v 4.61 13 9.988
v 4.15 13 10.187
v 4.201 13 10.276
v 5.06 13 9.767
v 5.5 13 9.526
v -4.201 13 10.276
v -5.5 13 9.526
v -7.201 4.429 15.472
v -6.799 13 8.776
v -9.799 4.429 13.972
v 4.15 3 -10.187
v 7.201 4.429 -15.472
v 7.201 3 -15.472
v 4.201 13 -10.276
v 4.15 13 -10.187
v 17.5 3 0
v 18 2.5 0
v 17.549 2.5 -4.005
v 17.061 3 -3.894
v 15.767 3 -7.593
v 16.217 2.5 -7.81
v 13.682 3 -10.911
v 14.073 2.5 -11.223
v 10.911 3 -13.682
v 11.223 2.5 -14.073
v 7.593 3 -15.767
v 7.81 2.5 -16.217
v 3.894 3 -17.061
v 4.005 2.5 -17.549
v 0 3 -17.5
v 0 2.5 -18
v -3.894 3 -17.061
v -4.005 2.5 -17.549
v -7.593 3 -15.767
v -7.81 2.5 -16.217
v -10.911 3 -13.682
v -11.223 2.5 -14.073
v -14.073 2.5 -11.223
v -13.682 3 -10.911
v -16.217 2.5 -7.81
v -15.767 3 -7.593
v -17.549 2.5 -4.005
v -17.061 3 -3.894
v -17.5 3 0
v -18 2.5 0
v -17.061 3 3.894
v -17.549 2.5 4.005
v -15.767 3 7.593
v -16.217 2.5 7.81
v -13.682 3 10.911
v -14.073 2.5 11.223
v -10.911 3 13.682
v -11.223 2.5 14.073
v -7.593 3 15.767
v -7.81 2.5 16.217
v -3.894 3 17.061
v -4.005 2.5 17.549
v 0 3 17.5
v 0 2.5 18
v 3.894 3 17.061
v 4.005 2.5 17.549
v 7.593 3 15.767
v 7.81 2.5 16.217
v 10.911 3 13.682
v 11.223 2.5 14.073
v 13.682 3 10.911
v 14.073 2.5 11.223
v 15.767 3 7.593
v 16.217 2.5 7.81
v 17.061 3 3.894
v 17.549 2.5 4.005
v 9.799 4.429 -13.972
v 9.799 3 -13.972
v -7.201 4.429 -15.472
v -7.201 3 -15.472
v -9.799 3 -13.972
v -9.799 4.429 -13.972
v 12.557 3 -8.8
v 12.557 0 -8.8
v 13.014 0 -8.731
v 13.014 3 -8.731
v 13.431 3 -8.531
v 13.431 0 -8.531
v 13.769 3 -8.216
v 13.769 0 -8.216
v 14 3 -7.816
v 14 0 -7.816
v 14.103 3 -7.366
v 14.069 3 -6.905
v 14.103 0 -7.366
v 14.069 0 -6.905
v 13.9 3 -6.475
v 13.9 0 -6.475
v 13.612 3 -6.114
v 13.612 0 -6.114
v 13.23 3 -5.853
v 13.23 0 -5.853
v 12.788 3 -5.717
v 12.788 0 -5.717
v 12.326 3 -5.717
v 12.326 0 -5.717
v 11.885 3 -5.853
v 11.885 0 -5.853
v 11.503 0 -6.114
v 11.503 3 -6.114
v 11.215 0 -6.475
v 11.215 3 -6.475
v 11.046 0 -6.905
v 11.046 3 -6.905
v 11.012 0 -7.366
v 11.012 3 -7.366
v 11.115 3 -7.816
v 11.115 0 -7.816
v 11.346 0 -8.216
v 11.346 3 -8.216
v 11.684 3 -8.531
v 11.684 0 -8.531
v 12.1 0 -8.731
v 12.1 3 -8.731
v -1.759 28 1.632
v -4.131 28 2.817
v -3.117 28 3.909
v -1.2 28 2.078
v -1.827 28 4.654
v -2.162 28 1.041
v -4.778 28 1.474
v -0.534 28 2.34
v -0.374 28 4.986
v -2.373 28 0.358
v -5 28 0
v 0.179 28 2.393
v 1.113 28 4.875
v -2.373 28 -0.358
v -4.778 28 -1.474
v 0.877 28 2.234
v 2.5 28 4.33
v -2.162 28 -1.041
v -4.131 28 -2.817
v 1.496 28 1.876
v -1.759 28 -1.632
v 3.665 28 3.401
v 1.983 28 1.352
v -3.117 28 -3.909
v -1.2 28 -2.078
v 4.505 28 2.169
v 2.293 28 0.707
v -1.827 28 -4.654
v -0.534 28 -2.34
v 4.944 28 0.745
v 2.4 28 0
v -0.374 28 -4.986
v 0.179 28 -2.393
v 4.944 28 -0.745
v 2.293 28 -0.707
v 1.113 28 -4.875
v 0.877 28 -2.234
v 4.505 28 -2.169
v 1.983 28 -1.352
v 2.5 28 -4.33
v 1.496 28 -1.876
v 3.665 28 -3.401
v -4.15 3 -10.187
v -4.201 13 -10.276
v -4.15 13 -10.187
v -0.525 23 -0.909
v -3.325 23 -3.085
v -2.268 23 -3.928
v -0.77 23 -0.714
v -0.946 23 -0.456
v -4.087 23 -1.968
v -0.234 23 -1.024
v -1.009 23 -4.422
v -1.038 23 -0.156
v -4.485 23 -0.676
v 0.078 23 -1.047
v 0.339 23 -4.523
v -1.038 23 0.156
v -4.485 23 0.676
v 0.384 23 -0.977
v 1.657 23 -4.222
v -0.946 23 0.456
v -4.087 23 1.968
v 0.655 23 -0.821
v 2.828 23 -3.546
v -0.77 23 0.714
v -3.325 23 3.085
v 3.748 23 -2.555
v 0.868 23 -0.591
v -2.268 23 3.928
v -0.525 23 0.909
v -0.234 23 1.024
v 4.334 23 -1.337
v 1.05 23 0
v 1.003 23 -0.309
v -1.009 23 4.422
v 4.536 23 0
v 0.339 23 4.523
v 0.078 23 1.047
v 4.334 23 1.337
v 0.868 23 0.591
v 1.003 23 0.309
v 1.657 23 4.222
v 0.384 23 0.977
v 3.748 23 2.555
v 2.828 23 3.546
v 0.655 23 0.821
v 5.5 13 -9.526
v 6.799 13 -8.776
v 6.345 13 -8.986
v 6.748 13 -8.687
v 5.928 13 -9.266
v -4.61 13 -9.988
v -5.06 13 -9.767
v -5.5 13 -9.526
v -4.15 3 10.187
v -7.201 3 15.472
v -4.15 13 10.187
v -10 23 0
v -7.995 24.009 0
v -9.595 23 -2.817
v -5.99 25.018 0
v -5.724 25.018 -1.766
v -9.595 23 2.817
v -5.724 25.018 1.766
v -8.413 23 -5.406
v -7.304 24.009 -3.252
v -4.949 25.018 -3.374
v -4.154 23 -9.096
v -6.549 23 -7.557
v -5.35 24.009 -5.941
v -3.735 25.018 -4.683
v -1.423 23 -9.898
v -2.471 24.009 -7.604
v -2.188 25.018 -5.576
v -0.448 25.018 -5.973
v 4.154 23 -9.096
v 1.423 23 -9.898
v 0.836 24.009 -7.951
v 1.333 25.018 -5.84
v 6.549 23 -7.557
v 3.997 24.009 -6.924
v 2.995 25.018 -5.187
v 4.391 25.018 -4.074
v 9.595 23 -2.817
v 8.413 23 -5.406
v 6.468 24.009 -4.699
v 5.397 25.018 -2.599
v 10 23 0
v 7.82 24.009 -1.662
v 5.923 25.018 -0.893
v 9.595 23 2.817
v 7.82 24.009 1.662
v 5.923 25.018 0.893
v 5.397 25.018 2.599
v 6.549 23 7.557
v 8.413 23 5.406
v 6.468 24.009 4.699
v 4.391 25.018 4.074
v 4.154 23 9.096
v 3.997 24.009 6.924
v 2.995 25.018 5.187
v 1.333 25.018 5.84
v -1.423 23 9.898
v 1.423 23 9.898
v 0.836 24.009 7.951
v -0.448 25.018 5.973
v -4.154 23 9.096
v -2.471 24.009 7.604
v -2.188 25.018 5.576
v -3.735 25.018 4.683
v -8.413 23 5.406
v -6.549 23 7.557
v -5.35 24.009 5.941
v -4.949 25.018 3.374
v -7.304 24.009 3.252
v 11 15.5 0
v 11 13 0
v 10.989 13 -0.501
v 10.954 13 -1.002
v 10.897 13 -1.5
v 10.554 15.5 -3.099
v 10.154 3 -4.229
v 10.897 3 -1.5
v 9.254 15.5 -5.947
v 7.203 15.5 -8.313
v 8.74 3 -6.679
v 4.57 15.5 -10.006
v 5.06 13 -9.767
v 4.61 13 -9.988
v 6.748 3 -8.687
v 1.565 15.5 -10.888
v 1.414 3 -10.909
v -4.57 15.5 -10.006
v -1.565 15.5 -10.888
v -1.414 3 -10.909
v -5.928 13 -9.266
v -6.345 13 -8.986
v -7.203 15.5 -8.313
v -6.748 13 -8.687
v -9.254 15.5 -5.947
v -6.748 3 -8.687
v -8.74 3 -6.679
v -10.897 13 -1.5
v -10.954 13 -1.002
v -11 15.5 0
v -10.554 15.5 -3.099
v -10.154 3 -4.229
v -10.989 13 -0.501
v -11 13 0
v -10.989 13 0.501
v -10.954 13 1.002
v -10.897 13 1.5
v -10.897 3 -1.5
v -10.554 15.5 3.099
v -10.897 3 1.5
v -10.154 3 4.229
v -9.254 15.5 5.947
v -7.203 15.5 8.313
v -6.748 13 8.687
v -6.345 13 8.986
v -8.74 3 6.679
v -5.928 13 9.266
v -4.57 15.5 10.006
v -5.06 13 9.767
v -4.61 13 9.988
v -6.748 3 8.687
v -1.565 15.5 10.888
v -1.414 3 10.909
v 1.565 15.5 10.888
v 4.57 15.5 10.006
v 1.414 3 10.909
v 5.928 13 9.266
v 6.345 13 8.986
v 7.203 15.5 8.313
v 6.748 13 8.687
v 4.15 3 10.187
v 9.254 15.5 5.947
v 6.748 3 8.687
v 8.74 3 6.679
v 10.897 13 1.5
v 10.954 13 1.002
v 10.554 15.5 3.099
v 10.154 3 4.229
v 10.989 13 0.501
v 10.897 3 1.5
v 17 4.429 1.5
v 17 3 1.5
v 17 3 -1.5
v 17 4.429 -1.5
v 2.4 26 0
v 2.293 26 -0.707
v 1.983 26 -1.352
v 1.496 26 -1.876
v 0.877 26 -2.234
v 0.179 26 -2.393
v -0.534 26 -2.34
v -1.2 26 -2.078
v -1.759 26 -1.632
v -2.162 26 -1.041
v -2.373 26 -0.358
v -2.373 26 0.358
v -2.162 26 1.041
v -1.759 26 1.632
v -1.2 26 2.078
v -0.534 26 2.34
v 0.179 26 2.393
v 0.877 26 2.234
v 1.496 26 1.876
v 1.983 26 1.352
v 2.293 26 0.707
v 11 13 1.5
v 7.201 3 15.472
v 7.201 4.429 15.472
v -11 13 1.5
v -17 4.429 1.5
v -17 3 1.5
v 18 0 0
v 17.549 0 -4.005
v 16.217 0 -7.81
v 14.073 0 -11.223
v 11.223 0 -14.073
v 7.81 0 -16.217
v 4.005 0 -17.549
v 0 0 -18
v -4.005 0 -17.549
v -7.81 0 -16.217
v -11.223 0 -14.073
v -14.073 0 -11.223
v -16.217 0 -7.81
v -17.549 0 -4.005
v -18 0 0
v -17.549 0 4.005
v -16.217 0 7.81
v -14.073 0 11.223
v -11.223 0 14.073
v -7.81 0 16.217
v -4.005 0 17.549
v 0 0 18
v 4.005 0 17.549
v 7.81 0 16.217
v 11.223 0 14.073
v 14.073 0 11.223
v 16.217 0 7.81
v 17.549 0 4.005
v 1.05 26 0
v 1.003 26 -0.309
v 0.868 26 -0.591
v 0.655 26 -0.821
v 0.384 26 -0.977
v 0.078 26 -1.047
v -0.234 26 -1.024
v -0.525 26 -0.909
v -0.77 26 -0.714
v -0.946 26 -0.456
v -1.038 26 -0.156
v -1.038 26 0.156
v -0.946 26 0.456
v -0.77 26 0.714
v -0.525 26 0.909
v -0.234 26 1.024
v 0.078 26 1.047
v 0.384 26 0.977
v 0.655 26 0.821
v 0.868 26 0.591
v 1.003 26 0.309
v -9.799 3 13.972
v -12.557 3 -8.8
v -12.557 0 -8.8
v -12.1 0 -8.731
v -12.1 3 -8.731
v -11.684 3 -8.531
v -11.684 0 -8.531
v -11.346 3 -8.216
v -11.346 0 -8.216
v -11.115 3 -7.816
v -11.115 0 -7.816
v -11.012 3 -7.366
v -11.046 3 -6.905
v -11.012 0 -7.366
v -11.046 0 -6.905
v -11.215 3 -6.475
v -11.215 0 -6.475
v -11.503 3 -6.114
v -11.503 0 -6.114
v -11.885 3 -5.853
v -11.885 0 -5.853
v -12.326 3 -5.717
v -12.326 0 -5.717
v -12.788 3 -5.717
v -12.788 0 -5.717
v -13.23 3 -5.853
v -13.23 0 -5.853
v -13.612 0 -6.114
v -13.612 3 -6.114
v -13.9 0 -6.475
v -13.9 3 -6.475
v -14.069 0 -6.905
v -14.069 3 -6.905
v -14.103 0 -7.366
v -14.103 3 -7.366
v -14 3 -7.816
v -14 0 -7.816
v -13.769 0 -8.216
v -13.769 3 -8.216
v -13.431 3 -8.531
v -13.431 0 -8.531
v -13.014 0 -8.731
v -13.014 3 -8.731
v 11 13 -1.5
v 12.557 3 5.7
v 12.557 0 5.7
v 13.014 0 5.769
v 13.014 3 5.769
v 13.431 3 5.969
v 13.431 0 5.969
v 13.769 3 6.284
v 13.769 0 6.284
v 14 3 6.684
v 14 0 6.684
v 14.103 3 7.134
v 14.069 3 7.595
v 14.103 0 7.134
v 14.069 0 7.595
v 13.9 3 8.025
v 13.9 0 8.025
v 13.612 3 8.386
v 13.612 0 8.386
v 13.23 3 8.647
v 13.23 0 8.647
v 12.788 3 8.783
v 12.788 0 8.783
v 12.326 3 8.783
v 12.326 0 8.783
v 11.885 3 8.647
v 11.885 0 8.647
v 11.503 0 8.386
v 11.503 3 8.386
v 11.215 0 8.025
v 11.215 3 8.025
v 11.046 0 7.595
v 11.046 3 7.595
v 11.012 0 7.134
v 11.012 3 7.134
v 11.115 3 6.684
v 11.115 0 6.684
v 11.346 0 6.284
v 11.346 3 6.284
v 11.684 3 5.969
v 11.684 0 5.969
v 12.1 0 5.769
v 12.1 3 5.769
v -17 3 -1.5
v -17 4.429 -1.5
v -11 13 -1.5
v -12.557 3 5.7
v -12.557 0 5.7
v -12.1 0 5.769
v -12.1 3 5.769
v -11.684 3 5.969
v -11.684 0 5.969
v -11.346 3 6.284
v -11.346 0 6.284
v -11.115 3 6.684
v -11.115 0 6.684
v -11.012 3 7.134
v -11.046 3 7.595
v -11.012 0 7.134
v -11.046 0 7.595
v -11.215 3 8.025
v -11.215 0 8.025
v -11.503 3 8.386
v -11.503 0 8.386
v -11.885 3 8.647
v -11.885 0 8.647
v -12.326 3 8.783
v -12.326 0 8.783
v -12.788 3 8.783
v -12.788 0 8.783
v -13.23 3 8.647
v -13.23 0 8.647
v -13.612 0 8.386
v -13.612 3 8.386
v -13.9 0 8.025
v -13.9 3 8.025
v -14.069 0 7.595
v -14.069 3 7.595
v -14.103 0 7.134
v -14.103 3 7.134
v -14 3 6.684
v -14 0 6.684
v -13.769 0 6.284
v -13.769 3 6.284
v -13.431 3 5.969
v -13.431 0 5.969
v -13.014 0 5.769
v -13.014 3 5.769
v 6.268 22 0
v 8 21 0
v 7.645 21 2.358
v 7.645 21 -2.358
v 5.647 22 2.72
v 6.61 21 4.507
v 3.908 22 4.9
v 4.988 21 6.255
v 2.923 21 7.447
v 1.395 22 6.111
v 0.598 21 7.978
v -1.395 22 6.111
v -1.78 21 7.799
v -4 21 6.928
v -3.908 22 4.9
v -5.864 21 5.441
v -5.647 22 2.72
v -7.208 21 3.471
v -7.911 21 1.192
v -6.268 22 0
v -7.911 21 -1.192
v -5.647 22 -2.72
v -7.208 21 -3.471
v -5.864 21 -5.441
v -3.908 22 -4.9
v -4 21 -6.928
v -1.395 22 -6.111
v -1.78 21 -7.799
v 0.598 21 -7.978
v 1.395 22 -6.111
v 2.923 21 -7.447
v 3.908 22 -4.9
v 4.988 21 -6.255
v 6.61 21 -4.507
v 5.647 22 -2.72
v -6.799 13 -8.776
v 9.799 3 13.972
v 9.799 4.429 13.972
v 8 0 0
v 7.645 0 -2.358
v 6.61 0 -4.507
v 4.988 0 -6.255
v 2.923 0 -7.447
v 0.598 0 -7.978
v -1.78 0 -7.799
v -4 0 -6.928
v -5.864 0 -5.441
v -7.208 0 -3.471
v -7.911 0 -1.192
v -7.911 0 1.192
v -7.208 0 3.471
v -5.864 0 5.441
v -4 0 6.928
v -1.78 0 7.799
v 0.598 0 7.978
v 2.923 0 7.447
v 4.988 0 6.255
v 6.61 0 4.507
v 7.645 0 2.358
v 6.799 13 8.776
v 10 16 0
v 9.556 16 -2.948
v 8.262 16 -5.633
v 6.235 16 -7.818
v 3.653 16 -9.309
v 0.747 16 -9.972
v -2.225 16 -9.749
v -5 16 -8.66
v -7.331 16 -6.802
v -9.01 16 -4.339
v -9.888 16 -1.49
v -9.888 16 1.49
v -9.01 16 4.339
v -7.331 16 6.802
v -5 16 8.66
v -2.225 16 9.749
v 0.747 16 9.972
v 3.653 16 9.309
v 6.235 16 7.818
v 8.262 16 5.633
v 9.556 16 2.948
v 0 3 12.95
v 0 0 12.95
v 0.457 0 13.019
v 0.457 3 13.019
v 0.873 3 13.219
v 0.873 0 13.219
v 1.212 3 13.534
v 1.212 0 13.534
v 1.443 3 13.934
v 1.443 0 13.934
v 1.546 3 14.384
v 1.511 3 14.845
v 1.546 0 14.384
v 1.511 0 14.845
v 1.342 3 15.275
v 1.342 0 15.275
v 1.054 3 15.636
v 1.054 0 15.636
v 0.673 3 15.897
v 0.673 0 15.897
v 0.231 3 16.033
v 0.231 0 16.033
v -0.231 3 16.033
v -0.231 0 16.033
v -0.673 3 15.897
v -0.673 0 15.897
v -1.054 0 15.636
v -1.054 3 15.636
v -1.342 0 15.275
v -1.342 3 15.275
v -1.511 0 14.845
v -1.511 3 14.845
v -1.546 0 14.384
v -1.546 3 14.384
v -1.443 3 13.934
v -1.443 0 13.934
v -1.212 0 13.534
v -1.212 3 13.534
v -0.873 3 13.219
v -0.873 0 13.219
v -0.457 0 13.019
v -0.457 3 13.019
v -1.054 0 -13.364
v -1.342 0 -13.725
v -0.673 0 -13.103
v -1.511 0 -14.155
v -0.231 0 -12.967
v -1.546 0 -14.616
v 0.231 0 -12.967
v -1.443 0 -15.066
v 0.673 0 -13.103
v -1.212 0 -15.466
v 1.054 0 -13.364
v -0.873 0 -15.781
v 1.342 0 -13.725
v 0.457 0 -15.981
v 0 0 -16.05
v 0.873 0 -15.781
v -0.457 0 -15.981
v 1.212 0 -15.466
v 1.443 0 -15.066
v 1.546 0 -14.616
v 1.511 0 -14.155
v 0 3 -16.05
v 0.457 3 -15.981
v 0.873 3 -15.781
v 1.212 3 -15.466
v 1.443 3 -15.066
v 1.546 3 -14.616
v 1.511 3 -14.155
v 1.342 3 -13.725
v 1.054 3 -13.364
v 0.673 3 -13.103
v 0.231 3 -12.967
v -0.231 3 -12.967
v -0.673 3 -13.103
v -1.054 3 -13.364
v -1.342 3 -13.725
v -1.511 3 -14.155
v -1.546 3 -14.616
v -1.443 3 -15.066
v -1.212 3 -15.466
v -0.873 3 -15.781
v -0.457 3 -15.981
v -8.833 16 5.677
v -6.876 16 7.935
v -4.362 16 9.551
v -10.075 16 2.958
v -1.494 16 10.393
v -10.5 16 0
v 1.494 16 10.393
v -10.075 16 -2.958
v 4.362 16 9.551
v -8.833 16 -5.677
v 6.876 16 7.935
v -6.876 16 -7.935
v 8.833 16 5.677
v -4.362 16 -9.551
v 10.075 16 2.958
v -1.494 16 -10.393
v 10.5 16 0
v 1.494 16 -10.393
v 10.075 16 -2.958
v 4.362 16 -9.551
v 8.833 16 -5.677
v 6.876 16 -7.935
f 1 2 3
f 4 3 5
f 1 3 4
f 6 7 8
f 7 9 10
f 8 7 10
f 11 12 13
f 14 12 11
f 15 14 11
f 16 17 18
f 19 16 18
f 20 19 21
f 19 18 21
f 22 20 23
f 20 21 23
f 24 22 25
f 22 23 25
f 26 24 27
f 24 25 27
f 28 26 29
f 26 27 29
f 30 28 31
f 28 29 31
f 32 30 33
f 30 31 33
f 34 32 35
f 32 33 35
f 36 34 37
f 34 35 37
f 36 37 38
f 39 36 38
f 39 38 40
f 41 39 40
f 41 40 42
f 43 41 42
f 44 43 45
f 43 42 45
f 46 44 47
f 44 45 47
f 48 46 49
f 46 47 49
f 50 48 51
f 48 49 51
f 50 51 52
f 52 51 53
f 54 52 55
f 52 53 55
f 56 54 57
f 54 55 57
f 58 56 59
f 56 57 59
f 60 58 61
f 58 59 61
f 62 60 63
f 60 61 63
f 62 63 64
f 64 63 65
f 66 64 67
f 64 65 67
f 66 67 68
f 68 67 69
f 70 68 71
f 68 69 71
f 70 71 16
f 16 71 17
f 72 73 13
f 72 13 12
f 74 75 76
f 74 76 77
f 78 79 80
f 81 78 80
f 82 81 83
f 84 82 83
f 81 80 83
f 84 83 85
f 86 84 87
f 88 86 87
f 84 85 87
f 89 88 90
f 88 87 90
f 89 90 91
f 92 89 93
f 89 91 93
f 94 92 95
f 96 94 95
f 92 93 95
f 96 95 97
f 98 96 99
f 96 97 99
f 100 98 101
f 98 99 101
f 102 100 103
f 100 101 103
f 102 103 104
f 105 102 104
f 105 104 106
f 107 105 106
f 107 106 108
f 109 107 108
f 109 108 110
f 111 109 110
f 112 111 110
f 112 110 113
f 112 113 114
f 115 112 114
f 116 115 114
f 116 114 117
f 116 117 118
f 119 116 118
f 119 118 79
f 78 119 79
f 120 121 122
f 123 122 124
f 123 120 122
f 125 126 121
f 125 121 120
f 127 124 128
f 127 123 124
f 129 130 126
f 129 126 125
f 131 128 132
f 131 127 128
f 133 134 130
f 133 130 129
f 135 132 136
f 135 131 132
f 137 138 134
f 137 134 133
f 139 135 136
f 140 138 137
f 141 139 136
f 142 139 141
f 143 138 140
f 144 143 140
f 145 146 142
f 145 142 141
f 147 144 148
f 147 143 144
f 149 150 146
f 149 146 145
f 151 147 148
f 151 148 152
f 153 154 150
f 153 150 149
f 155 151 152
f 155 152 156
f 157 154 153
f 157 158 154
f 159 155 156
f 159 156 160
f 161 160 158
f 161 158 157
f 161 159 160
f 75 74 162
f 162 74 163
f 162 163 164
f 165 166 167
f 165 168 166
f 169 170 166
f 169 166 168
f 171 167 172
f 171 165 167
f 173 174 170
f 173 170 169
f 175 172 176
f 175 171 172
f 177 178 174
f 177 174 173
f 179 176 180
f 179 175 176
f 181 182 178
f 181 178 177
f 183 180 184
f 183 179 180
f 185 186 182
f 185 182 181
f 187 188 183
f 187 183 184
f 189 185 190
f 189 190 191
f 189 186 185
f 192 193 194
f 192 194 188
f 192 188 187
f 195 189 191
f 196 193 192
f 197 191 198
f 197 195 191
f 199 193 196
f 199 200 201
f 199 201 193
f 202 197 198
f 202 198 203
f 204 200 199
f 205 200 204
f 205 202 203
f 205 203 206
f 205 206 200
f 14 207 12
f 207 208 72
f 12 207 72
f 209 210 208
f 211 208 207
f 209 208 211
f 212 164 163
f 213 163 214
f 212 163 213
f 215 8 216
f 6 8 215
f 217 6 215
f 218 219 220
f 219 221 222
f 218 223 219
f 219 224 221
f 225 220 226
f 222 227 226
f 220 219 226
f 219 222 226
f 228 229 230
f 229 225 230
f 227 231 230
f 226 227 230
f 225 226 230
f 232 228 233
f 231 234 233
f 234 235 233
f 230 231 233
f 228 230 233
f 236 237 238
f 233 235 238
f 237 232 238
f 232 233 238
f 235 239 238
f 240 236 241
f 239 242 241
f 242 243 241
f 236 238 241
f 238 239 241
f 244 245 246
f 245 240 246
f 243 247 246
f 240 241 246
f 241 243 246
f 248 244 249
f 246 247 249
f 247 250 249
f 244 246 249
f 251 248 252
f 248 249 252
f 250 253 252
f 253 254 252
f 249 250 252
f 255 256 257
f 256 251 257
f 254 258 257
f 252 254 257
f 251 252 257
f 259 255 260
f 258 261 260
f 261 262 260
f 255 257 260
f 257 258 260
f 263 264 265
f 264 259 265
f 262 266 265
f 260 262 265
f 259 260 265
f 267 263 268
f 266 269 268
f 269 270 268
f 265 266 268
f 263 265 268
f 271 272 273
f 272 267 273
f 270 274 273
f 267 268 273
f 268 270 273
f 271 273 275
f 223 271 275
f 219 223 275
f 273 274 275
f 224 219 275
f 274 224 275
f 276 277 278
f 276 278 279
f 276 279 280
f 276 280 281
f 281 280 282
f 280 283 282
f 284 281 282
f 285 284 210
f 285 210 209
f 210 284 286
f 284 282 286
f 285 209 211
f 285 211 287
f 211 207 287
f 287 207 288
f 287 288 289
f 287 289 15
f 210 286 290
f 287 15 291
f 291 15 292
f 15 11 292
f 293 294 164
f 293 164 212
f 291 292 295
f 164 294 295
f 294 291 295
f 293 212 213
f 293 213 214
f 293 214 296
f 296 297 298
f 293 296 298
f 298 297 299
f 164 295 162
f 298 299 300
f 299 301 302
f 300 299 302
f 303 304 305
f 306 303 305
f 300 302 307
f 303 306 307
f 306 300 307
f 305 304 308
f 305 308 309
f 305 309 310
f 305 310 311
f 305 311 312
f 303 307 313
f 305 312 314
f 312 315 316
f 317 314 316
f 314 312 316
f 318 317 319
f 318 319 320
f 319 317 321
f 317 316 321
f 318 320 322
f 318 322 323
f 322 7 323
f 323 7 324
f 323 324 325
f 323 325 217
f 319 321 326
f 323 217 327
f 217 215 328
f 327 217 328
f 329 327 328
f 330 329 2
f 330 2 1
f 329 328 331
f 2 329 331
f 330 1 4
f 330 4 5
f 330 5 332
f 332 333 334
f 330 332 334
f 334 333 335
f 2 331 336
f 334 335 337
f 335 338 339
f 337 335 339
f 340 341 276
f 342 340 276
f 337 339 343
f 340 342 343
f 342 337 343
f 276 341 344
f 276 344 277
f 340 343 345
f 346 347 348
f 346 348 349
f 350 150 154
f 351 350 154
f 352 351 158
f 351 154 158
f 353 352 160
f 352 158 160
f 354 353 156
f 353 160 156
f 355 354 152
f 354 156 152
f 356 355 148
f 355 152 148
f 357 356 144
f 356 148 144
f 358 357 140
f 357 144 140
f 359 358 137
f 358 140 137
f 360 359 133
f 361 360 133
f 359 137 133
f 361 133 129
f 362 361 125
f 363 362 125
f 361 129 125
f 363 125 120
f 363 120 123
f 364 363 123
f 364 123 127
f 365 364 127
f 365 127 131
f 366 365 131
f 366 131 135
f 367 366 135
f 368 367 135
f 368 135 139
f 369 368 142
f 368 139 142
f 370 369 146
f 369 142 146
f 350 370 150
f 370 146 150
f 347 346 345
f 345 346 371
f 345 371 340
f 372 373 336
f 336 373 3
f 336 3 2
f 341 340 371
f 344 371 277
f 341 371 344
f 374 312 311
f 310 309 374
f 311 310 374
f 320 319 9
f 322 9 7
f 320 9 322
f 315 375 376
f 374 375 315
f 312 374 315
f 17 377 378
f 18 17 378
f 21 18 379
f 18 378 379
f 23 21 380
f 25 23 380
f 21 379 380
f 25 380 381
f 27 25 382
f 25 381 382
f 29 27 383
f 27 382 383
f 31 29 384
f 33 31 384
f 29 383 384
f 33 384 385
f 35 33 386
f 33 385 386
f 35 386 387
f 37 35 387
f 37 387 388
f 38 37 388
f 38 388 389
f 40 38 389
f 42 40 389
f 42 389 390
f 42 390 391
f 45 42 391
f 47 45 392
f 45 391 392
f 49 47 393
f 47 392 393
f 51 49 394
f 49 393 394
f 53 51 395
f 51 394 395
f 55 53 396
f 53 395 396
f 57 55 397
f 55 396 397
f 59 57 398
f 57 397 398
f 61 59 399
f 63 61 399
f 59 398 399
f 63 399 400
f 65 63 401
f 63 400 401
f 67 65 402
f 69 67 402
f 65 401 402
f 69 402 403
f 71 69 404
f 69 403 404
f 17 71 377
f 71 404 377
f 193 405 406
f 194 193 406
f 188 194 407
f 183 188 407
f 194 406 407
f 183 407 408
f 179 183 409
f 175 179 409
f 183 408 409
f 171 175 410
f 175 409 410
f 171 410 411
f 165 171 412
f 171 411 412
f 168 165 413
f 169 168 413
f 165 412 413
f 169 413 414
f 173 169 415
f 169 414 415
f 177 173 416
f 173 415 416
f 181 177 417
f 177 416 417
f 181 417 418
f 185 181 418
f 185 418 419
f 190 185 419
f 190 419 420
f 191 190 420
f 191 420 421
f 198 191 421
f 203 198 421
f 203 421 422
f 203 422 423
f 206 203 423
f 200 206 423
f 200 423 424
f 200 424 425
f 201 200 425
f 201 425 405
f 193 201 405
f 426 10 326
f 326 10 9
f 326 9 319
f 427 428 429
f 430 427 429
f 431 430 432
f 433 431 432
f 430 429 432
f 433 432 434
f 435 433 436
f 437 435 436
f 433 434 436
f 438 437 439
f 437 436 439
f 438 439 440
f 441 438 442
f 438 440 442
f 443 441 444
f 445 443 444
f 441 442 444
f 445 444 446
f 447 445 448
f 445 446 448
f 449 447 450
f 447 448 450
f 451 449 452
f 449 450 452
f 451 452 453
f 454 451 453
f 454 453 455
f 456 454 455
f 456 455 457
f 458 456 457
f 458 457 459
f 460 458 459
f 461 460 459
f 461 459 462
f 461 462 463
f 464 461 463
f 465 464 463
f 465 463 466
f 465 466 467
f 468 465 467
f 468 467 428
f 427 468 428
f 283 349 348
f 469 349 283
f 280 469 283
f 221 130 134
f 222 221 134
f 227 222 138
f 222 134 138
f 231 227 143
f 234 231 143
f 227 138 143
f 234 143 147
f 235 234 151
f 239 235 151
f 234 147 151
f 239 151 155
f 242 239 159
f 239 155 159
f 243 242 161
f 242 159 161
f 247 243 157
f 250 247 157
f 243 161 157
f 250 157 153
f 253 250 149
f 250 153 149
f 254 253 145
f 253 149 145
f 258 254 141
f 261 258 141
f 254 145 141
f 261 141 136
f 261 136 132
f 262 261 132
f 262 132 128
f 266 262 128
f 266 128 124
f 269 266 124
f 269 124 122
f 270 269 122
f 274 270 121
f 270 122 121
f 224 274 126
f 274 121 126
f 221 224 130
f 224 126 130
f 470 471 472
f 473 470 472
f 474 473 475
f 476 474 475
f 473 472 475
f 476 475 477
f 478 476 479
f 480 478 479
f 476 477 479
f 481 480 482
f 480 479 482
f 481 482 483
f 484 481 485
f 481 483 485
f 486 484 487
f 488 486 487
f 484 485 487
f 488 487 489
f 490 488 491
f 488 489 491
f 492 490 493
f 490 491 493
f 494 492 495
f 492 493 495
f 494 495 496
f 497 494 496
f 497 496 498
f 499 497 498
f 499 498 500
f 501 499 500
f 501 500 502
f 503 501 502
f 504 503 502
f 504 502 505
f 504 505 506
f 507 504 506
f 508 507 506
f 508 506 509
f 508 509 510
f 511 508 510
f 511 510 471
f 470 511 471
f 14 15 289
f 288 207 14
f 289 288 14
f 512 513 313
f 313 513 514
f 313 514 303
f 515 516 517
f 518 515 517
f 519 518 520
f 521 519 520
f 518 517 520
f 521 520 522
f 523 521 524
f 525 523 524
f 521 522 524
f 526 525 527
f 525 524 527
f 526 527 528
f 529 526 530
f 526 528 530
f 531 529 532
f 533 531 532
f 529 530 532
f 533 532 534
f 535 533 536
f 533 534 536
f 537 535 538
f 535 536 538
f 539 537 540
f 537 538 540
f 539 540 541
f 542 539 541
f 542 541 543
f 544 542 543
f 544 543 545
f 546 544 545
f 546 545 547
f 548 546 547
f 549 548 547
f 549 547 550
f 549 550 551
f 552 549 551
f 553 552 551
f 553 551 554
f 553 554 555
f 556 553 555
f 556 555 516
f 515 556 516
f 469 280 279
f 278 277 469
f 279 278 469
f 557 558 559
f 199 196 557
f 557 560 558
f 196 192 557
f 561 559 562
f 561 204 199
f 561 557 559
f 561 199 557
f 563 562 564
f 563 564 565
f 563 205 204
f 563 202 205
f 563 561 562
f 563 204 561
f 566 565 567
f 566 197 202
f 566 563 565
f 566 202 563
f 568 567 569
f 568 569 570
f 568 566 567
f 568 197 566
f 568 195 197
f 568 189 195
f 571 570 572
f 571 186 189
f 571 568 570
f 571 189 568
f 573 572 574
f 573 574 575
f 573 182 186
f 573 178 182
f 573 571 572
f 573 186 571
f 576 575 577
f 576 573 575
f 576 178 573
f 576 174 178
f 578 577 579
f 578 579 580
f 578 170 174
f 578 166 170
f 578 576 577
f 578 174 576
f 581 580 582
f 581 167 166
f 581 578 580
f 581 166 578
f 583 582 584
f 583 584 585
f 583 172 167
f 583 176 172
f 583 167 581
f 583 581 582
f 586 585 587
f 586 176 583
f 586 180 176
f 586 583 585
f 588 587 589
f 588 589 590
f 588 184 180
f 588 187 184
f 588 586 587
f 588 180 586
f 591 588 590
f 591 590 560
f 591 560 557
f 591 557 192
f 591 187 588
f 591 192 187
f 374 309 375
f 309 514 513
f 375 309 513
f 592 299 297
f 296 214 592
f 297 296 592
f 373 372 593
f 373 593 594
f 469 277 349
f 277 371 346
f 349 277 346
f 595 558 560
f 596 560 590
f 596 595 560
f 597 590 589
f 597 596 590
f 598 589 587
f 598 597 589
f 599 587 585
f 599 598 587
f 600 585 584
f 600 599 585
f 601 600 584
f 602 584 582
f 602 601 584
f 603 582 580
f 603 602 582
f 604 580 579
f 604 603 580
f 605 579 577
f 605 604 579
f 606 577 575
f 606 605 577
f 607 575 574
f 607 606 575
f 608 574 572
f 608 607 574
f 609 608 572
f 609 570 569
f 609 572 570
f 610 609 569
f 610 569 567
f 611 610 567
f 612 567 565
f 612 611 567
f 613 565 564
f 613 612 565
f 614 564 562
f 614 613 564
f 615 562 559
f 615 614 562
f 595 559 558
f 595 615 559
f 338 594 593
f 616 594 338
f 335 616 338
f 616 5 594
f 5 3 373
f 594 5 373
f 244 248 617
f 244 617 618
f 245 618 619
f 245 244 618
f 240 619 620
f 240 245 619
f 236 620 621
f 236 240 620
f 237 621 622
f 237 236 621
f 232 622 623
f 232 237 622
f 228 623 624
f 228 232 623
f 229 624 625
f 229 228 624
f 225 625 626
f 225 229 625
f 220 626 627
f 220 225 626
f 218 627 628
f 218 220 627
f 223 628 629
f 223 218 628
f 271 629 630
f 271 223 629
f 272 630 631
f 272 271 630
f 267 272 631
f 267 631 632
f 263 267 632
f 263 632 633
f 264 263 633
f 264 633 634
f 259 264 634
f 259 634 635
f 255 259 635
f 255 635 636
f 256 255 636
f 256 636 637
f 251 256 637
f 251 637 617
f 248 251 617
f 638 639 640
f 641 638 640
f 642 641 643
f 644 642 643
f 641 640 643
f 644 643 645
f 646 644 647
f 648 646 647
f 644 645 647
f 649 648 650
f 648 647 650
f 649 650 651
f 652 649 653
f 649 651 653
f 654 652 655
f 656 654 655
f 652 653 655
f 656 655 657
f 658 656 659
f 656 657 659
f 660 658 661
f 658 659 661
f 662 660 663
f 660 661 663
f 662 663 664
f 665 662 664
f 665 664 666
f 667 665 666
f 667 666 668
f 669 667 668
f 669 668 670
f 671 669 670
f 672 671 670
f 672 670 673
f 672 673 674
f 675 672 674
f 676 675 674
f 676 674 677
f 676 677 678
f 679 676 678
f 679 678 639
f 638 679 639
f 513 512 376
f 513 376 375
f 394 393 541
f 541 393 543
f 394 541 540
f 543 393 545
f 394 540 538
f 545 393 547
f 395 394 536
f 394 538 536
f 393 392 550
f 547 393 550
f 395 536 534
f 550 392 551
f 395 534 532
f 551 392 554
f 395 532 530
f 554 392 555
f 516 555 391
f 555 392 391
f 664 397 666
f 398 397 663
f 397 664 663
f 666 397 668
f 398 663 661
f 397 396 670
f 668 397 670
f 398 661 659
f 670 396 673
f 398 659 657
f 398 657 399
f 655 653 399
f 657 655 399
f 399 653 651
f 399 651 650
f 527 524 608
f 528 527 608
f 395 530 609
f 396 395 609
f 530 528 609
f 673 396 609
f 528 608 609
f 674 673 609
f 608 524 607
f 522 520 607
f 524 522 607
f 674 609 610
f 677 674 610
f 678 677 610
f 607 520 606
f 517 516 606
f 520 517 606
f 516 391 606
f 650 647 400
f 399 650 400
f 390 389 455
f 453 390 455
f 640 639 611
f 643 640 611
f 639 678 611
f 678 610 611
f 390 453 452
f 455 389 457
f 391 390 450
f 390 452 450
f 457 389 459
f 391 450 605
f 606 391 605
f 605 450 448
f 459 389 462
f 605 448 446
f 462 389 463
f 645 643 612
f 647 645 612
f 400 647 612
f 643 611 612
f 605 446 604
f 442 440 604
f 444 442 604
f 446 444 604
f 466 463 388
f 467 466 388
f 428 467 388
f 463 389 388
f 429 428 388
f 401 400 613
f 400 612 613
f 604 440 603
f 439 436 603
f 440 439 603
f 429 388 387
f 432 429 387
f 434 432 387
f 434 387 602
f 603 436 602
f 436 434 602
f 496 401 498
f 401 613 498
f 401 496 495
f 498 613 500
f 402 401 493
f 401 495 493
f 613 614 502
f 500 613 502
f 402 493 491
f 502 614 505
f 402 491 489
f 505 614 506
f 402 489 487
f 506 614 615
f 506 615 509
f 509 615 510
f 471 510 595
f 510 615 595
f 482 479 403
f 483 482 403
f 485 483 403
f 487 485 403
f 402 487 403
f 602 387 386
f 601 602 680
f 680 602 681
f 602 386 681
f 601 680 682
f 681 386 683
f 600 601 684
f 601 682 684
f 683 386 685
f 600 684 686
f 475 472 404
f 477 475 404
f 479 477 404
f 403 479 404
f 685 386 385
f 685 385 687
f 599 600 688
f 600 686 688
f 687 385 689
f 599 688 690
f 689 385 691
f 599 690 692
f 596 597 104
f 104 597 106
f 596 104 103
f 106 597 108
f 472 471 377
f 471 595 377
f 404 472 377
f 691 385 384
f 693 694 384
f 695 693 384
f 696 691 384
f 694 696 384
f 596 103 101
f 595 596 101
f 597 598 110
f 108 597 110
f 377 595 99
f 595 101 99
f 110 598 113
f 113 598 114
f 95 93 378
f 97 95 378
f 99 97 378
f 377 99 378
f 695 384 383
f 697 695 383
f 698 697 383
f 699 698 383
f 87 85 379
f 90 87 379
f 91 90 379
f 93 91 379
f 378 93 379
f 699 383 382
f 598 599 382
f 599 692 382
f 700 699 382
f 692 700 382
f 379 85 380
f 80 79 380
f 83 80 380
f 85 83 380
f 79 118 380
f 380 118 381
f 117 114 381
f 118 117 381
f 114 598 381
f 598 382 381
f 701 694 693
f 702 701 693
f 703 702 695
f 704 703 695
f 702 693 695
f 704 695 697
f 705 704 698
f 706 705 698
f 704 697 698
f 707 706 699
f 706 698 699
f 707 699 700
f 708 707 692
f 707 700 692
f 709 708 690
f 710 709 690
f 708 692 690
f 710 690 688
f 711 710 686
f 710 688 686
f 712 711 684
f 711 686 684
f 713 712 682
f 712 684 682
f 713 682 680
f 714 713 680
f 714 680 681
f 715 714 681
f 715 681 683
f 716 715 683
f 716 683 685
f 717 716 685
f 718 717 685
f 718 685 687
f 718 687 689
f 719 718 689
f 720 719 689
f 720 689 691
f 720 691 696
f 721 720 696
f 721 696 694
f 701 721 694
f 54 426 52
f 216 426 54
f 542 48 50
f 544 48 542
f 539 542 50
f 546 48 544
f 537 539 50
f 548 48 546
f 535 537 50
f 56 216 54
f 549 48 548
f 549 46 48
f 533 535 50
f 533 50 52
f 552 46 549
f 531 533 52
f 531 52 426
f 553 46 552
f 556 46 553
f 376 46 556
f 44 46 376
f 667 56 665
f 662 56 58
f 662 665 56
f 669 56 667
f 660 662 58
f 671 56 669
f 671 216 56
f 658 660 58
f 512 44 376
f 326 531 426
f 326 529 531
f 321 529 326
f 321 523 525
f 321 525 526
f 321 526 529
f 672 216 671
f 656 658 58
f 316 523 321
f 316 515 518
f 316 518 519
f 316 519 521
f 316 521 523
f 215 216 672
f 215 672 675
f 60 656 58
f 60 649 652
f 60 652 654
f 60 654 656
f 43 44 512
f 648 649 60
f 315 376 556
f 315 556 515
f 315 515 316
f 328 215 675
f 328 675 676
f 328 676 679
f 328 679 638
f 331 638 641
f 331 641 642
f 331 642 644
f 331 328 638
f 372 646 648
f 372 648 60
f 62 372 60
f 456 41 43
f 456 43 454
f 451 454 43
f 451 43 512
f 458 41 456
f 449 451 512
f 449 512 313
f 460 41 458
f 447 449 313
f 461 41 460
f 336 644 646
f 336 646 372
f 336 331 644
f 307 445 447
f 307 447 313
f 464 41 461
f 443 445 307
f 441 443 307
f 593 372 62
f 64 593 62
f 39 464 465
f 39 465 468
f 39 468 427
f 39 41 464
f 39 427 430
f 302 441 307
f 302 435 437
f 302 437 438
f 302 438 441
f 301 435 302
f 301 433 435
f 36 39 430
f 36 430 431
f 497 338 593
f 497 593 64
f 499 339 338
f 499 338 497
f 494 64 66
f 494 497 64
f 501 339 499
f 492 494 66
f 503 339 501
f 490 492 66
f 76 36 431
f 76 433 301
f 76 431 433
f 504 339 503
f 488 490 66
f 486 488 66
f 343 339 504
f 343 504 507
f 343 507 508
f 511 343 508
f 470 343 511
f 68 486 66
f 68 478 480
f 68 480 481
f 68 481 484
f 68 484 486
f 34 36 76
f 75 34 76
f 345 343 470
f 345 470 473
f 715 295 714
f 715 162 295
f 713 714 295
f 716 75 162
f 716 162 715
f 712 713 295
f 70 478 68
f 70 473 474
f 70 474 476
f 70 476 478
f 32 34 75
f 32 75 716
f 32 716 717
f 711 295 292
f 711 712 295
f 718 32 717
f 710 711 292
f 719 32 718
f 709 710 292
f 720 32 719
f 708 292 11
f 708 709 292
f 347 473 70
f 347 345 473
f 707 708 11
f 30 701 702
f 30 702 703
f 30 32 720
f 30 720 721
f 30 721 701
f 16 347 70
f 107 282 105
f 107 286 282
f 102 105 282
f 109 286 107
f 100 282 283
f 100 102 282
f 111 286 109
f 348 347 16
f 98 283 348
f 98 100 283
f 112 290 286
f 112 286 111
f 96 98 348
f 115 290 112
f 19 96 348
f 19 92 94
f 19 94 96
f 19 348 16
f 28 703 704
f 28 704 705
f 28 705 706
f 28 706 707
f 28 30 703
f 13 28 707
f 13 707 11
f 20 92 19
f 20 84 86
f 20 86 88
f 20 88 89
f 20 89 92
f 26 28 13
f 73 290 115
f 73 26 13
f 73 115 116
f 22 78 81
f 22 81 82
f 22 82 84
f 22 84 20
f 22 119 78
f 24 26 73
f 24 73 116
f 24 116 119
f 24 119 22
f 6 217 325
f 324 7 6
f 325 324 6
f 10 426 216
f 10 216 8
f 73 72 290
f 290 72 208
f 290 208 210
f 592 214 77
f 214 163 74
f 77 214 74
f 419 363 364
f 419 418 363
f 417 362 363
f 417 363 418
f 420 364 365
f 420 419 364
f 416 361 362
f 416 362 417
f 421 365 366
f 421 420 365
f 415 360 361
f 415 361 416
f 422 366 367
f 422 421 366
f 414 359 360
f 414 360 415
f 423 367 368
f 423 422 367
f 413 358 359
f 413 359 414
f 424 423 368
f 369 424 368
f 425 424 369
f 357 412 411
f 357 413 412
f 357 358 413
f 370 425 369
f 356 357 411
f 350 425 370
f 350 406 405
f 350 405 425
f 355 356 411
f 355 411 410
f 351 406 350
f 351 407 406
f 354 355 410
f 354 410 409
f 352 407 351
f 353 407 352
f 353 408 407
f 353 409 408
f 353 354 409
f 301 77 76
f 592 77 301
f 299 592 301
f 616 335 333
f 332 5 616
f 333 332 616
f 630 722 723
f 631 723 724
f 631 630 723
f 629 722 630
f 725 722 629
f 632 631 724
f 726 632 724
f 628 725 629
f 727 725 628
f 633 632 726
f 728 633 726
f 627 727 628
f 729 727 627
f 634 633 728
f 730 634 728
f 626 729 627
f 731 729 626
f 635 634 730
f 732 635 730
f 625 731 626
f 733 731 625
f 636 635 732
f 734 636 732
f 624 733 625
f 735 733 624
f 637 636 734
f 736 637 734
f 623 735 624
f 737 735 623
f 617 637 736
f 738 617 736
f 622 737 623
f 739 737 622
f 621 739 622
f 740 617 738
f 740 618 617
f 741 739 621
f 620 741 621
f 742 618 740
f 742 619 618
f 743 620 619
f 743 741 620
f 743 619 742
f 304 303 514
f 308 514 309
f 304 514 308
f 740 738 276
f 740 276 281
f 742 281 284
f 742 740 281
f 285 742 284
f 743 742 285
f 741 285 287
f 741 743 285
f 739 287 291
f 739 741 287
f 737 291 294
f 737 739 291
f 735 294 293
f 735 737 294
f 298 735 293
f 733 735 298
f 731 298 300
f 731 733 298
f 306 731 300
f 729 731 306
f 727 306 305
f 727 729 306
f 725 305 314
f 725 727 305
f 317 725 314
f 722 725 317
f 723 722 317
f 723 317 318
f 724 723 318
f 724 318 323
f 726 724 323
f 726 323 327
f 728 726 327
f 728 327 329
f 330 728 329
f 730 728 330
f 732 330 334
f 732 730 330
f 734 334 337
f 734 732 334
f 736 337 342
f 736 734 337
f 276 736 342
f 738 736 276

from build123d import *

# Parameters (mm, degrees)
SKETCH1_R                = 18
SKETCH1_R_2              = 8
BOSS_EXTRUDE1_DEPTH      = 3
SKETCH2_R                = 11
SKETCH2_R_2              = 8
BOSS_EXTRUDE2_DEPTH      = 22
M_0_295_DIAMETER_HOLE1_D = 3.099999896
BOSS_EXTRUDE3_DEPTH      = 1.5
CIRPATTERN1_COUNT        = 6
CHAMFER2_SIZE            = 0.5
SKETCH6_R                = 11
BOSS_EXTRUDE4_DEPTH      = 3
SKETCH8_R                = 8
BOSS_EXTRUDE5_DEPTH      = 2
CHAMFER3_SIZE            = 6
SKETCH7_R                = 2.4
CUT_EXTRUDE1_DEPTH       = 2
CUT_EXTRUDE2_REACH       = 28
SKETCH9_R                = 1.05
SKETCH10_R               = 11
SKETCH10_R_2             = 10
CUT_EXTRUDE3_DEPTH       = 12
CHAMFER4_SIZE            = 0.5
CHAMFER5_SIZE            = 2
CHAMFER5_SIZE2           = 3.464101615


with BuildPart() as part:
    # Sketch1 → Boss-Extrude1 (new body)
    with BuildSketch(Plane(origin=(0, 0, 0), x_dir=(1, 0, 0), z_dir=(0, 1, 0))):
        Circle(SKETCH1_R)
        Circle(SKETCH1_R_2, mode=Mode.SUBTRACT)
    extrude(amount=BOSS_EXTRUDE1_DEPTH)

    # Sketch2 → Boss-Extrude2 (add)
    with BuildSketch(Plane(origin=(0, 3, 0), x_dir=(1, 0, 0), z_dir=(0, 1, 0))):
        Circle(SKETCH2_R)
        Circle(SKETCH2_R_2, mode=Mode.SUBTRACT)
    extrude(amount=BOSS_EXTRUDE2_DEPTH)

    # M (0.295) Diameter Hole1 (through all)
    with Locations(Plane(origin=(0, 3, 14.5), x_dir=(0, 0, 1), z_dir=(0, 1, 0))):
        with Locations((0, 0), (-7.25, -12.557368355), (-7.25, 12.557368355), (-21.75, 12.557368355), (-29, 0), (-21.75, -12.557368355)):
            Hole(M_0_295_DIAMETER_HOLE1_D / 2)

    # Sketch5 → Boss-Extrude3 (add, symmetric)
    with BuildSketch(Plane.XY):
        Polygon((11, 13), (17, 4.428571429), (17, 3), (17, 2.5), (10.5, 2.5), (10.5, 13), align=None)
    boss_extrude3 = extrude(amount=BOSS_EXTRUDE3_DEPTH, both=True)

    # CirPattern1: Boss-Extrude3 ×6 about axis
    cirpattern1_axis = Axis((0, 0, 0), (0, 1, 0))
    for i in range(1, CIRPATTERN1_COUNT):
        add(boss_extrude3.rotate(cirpattern1_axis, i * 360 / CIRPATTERN1_COUNT))

    # Chamfer2
    chamfer2_edges = [part.edges().sort_by_distance(p)[0] for p in [
        (-18, 3, 0),
    ]]
    chamfer(chamfer2_edges, length=CHAMFER2_SIZE)

    # Sketch6 → Boss-Extrude4 (add)
    with BuildSketch(Plane(origin=(0, 25, 0), x_dir=(1, 0, 0), z_dir=(0, 1, 0))):
        Circle(SKETCH6_R)
    extrude(amount=BOSS_EXTRUDE4_DEPTH)

    # Sketch8 → Boss-Extrude5 (add)
    with BuildSketch(Plane.XZ.offset(-25)):
        Circle(SKETCH8_R)
    extrude(amount=BOSS_EXTRUDE5_DEPTH)

    # Chamfer3
    chamfer3_edges = [part.edges().sort_by_distance(p)[0] for p in [
        (-11, 28, 0),
    ]]
    chamfer(chamfer3_edges, length=CHAMFER3_SIZE)

    # Sketch7 → Cut-Extrude1 (cut)
    with BuildSketch(Plane(origin=(0, 28, 0), x_dir=(1, 0, 0), z_dir=(0, 1, 0))):
        Circle(SKETCH7_R)
    extrude(amount=-CUT_EXTRUDE1_DEPTH, mode=Mode.SUBTRACT)

    # Sketch9 → Cut-Extrude2 (cut, up to next)
    with BuildSketch(Plane(origin=(0, 26, 0), x_dir=(1, 0, 0), z_dir=(0, 1, 0)), mode=Mode.PRIVATE) as cut_extrude2_sk1:
        Circle(SKETCH9_R)
    cut_extrude2_tool1 = extrude(cut_extrude2_sk1.sketch, amount=-CUT_EXTRUDE2_REACH, mode=Mode.PRIVATE) & part.part
    add(cut_extrude2_tool1.solids().sort_by_distance((0, 26, 0))[0], mode=Mode.SUBTRACT)

    # Sketch10 → Cut-Extrude3 (cut)
    with BuildSketch(Plane(origin=(0, 28, 0), x_dir=(1, 0, 0), z_dir=(0, 1, 0))):
        Circle(SKETCH10_R)
        Circle(SKETCH10_R_2, mode=Mode.SUBTRACT)
    extrude(amount=-CUT_EXTRUDE3_DEPTH, mode=Mode.SUBTRACT)

    # Chamfer4
    chamfer4_edges = [part.edges().sort_by_distance(p)[0] for p in [
        (-11, 16, 0),
    ]]
    chamfer(chamfer4_edges, length=CHAMFER4_SIZE)

    # Sketch11 → Cut-Revolve1 (revolve, cut)
    with BuildSketch(Plane.XY):
        Polygon((-5, 28), (-5, 29.257596247), (-10, 29.257596247), (-10, 23), (-5.989740888, 25.017543101), align=None)
    revolve(axis=Axis((0, 18, 0), (0, -1, 0)), mode=Mode.SUBTRACT)

    # Chamfer5
    chamfer5_edges = [part.edges().sort_by_distance(p)[0] for p in [
        (-8, 23, 0),
    ]]
    chamfer5_side = [part.faces().sort_by_distance(p)[0] for p in [
        (-8, 11.5, 0),
    ]]
    chamfer(chamfer5_edges, length=CHAMFER5_SIZE, length2=CHAMFER5_SIZE2, reference=chamfer5_side[0])


solid = part.part
